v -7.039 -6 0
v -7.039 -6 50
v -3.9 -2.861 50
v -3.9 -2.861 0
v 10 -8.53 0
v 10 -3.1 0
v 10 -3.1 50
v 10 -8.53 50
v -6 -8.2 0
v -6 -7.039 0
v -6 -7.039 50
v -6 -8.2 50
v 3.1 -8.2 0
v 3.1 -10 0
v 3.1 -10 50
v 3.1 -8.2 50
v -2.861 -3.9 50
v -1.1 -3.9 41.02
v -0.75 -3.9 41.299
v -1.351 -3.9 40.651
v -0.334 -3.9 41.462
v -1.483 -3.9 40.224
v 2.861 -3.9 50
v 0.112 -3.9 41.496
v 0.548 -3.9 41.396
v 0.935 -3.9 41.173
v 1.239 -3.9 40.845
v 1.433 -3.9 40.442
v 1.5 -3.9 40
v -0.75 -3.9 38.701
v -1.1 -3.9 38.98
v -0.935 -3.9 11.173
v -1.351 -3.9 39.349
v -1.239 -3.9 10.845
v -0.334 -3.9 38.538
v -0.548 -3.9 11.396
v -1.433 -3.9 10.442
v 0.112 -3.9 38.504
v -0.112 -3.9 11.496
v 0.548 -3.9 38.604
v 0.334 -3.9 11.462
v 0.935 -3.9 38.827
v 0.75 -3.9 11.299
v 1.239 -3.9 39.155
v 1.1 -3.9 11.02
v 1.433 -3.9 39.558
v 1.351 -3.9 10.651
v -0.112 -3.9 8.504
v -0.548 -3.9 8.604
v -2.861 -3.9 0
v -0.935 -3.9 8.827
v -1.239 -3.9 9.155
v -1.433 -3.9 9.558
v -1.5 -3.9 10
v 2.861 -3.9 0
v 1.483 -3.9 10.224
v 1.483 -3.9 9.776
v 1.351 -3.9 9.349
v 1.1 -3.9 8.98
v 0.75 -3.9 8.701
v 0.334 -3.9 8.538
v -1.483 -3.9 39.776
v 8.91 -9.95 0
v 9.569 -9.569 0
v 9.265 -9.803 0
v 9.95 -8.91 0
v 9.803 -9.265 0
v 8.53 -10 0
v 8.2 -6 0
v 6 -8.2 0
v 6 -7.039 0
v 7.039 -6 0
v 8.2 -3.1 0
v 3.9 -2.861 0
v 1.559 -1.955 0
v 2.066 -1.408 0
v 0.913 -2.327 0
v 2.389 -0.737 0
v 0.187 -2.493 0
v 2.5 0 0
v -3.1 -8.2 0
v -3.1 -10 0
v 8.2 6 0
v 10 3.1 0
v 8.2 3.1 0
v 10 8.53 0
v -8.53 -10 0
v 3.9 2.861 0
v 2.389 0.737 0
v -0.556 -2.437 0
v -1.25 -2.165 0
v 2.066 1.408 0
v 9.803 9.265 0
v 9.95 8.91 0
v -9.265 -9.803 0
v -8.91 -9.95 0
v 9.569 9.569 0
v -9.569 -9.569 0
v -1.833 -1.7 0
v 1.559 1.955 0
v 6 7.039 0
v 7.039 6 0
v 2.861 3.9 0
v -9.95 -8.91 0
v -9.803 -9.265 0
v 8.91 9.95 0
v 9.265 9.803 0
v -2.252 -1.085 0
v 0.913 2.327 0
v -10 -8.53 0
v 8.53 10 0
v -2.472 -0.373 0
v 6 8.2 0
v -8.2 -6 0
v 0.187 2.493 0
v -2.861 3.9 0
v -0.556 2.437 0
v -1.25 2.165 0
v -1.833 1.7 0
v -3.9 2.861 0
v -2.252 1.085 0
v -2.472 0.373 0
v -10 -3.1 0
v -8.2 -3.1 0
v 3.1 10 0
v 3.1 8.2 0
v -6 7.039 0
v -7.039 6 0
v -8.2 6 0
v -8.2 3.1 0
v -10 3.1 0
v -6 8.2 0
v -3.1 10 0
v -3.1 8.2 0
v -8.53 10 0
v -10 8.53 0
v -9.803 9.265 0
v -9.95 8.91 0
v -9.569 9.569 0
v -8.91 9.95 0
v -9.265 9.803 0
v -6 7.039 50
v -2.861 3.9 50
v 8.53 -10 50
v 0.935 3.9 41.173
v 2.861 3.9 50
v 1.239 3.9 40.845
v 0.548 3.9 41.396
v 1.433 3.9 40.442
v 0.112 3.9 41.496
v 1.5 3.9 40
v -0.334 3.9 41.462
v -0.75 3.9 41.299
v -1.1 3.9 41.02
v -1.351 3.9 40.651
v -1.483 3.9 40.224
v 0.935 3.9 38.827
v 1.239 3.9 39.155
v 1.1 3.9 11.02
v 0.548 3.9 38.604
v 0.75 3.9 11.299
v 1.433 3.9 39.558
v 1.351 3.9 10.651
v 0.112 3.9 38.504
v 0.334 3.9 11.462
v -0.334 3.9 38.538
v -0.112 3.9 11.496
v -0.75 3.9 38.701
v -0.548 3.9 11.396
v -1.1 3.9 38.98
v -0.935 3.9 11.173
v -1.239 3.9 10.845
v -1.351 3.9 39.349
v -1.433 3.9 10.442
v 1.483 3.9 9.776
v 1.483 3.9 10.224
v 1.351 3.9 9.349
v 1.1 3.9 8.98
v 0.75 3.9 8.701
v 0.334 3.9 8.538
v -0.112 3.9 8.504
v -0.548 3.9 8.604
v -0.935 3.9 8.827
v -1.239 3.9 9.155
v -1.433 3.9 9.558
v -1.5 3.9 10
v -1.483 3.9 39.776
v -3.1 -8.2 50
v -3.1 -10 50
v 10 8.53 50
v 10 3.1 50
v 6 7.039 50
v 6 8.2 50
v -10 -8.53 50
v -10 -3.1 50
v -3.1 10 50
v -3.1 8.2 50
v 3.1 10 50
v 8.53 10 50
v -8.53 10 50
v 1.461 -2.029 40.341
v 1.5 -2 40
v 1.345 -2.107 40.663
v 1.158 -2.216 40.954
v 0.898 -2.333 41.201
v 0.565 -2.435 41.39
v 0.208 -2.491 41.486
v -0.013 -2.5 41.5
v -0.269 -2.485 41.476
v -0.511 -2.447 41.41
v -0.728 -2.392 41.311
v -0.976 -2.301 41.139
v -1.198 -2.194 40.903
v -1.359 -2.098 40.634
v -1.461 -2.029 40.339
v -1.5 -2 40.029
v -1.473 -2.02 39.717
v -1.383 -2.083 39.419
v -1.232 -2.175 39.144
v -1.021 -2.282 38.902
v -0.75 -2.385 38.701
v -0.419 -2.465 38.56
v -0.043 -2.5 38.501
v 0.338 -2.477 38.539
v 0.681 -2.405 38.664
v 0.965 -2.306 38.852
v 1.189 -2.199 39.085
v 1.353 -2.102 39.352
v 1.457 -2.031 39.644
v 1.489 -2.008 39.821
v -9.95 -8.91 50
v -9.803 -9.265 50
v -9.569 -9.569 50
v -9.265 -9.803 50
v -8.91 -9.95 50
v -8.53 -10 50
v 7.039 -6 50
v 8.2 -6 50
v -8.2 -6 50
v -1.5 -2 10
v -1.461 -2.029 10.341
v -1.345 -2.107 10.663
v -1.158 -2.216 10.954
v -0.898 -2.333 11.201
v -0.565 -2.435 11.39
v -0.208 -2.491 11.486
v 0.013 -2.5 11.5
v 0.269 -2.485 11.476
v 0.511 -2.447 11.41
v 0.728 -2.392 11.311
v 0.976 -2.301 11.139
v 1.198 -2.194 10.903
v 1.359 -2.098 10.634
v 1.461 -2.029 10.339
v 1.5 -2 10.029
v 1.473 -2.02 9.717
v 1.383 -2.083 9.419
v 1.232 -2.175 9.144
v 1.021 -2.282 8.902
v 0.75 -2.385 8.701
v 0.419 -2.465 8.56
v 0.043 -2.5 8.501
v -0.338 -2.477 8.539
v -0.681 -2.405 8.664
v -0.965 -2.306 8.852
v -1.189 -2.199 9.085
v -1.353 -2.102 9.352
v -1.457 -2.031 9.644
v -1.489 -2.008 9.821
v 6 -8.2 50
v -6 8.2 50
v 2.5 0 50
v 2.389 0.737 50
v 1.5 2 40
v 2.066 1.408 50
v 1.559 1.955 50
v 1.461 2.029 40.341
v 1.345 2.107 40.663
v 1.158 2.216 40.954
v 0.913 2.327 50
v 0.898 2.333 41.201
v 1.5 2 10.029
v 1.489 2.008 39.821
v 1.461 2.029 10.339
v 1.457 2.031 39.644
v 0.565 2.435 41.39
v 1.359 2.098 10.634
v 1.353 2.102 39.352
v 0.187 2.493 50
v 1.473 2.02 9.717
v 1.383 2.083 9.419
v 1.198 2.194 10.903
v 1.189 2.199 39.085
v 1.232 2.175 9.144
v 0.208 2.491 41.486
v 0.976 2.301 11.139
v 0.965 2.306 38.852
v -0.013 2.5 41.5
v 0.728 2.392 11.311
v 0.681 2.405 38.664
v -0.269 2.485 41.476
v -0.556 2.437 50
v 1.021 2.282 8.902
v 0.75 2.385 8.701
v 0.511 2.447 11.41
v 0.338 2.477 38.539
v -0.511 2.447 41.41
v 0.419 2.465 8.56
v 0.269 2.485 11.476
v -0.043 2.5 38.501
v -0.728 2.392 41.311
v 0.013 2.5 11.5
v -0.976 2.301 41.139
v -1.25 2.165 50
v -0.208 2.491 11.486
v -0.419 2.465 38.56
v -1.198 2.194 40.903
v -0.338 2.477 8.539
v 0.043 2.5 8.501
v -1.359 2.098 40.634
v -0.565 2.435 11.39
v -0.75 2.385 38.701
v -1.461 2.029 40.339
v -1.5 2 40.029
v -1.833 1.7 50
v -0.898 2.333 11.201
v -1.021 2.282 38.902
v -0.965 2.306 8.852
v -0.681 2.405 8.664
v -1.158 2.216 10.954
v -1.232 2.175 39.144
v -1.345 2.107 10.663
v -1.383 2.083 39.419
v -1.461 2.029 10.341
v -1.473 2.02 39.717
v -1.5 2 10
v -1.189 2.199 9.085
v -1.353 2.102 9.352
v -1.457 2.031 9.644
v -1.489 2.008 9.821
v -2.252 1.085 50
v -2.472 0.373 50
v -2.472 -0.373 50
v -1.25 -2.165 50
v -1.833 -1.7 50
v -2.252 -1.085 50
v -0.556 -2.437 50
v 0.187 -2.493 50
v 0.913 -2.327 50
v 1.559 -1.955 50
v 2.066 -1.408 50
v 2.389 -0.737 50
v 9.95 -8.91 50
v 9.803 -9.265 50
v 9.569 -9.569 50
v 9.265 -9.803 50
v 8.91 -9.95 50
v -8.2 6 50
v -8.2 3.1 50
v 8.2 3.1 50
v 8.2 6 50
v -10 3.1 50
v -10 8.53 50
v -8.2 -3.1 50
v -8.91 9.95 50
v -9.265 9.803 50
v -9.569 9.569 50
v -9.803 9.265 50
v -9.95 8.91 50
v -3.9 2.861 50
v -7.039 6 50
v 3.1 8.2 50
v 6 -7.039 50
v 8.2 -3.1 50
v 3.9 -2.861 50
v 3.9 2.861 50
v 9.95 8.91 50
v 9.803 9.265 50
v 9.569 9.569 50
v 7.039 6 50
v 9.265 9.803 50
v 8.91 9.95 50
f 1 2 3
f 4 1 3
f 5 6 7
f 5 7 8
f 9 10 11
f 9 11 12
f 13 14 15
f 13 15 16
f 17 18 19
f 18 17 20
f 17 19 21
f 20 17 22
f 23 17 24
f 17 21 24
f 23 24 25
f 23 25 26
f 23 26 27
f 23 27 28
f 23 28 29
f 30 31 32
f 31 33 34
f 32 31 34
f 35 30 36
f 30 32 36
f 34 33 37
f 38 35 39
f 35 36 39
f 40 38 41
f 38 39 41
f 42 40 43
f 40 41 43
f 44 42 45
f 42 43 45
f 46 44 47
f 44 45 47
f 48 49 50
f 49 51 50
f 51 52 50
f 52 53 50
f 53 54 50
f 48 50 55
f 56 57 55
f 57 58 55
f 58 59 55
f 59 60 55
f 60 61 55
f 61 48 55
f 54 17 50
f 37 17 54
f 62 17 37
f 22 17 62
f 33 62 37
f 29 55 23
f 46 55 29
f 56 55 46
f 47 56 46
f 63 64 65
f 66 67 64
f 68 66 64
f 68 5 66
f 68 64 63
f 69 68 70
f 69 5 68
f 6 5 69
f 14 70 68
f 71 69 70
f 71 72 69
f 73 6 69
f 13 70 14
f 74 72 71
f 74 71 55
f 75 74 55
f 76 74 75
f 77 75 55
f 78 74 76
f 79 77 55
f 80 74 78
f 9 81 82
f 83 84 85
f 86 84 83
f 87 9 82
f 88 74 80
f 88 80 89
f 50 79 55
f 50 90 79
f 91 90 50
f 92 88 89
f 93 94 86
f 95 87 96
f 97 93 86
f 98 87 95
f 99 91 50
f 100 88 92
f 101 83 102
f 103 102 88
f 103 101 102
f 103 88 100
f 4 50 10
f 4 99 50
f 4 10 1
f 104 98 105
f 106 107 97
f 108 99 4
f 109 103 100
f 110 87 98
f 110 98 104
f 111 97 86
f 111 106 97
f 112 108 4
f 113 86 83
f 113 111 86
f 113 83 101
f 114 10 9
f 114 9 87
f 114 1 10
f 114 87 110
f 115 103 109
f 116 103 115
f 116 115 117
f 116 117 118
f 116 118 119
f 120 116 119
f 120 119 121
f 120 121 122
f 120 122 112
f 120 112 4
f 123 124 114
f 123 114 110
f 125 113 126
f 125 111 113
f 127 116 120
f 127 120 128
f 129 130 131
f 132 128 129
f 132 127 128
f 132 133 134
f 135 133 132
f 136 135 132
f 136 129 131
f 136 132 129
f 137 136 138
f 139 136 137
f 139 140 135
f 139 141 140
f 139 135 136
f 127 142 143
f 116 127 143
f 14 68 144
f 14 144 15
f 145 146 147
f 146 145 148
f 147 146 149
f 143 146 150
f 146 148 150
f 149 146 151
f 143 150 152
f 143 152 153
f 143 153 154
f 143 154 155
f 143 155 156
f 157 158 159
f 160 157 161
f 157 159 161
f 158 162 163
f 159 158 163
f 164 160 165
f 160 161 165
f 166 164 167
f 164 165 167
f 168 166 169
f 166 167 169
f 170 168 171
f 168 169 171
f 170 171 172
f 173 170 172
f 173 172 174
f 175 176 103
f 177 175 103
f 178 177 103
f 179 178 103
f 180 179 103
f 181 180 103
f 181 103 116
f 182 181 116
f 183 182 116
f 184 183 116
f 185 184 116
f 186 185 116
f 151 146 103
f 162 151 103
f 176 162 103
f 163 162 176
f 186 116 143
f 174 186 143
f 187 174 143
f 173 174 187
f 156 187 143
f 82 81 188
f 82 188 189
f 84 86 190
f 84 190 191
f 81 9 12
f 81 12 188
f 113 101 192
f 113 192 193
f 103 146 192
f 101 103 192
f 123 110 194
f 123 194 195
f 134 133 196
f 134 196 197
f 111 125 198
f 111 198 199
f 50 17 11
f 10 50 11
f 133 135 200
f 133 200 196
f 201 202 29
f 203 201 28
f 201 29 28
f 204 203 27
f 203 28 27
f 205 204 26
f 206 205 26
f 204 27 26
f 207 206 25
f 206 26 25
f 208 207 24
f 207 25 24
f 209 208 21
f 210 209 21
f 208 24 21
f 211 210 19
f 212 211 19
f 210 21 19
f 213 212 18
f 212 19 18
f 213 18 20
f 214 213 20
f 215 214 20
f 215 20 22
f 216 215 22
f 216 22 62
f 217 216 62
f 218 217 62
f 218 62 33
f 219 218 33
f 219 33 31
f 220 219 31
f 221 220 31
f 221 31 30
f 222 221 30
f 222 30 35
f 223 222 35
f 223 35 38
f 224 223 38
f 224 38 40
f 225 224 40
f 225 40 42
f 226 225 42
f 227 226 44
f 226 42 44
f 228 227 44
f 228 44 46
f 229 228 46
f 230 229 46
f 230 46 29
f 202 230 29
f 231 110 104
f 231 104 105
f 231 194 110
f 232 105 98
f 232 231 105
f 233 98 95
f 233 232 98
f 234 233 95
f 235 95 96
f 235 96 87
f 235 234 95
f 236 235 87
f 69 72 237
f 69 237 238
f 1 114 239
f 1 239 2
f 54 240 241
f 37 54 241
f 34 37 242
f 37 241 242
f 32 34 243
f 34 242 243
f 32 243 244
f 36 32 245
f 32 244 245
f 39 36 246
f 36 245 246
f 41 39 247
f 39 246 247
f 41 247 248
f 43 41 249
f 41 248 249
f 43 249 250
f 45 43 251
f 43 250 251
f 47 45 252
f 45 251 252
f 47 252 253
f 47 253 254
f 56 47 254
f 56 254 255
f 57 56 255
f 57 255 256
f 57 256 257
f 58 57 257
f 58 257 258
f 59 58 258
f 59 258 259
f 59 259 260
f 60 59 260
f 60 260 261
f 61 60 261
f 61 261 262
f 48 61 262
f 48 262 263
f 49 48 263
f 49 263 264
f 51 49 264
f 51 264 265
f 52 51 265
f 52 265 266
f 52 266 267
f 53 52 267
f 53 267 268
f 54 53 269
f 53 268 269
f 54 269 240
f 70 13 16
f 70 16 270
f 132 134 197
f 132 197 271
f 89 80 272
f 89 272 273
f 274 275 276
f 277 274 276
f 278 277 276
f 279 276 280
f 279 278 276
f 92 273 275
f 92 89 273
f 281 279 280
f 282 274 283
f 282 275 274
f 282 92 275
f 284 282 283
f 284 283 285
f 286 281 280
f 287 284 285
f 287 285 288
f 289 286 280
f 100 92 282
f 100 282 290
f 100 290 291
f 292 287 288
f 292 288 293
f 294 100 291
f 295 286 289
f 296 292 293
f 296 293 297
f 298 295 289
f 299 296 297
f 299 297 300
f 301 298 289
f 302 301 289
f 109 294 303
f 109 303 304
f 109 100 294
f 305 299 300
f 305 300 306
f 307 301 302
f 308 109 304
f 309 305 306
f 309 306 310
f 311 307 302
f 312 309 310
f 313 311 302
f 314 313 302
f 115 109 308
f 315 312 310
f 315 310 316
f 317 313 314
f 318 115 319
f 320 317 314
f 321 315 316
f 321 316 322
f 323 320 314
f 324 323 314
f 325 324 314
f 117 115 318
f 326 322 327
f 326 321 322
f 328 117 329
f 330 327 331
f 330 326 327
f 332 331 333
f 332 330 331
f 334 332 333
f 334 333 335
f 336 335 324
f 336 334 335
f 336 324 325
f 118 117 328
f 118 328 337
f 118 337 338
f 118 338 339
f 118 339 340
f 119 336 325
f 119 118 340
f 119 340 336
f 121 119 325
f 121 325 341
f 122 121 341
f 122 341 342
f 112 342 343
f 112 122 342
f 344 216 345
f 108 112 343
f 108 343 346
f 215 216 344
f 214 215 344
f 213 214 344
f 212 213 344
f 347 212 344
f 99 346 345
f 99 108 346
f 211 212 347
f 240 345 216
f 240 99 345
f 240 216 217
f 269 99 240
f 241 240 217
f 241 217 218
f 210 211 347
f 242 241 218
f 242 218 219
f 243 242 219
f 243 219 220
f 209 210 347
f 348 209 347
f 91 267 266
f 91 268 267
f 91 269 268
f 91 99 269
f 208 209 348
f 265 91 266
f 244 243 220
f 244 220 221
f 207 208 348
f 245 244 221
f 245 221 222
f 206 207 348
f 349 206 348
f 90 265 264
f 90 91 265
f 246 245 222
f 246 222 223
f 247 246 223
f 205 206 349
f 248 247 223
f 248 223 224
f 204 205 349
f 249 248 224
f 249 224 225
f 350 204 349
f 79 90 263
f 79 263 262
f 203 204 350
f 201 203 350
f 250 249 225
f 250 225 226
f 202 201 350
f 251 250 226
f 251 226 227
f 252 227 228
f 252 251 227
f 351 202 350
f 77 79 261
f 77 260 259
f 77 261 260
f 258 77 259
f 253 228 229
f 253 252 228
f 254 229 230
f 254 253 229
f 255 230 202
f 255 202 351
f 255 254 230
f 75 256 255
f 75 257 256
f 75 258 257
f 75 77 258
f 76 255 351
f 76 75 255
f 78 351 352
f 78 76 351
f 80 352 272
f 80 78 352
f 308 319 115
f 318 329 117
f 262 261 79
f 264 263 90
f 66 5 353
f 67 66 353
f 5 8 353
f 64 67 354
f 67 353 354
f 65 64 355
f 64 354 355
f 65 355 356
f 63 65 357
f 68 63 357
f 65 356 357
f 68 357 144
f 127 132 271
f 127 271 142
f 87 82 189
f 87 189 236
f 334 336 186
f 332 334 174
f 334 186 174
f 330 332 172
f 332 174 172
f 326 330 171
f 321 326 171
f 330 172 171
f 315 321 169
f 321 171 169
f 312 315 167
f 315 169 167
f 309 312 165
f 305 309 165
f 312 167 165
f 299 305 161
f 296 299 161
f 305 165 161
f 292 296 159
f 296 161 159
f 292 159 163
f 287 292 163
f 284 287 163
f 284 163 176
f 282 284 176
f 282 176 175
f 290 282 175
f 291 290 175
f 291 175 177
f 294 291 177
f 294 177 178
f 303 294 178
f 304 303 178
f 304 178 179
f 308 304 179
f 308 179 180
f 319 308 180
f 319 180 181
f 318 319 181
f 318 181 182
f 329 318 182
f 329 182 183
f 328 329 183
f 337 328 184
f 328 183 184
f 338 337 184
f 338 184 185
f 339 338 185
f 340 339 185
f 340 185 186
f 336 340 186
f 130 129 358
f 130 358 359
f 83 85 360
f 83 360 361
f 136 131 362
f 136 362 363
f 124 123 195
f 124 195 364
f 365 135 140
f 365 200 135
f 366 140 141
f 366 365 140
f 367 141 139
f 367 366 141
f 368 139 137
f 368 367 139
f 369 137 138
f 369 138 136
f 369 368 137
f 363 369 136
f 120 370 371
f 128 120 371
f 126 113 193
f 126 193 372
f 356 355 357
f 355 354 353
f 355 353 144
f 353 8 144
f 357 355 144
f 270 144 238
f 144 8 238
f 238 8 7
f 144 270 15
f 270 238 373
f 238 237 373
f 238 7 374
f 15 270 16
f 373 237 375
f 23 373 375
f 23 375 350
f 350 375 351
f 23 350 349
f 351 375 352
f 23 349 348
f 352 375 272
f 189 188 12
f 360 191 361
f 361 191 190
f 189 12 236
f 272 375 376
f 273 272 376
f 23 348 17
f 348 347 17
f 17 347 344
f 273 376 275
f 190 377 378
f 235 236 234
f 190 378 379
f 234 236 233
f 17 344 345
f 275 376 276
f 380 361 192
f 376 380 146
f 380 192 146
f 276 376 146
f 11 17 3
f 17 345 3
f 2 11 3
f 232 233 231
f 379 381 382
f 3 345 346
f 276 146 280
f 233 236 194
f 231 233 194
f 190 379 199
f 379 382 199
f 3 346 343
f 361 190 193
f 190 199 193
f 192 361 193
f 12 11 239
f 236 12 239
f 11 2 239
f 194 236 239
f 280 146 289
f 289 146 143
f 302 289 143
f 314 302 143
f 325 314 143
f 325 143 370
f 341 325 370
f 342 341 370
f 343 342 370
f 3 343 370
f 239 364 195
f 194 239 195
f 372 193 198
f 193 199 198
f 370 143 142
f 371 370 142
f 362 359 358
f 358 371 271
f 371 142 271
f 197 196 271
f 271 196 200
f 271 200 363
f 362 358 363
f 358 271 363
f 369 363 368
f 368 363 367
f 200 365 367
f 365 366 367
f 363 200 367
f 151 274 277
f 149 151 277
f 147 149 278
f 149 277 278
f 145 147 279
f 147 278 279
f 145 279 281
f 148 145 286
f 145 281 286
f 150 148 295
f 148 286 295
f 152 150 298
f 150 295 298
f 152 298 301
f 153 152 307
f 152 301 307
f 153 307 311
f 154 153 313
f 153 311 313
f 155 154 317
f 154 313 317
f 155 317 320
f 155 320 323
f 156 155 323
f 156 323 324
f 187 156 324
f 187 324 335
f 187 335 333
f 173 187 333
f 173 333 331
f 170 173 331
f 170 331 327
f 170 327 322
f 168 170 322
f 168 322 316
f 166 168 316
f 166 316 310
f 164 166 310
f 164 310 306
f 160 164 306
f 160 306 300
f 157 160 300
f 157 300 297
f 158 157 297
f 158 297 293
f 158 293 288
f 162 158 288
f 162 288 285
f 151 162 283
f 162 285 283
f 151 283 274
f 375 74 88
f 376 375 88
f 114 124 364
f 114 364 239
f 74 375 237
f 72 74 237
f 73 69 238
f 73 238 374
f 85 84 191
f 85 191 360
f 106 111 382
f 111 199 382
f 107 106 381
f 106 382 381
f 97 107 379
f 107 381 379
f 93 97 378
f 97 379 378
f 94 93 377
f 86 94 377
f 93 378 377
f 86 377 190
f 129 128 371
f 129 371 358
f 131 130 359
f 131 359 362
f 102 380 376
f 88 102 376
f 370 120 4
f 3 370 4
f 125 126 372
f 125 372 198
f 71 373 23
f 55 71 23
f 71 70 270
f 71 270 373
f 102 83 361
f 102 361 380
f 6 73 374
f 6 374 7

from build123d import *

# Parameters (mm, degrees)
SKETCH1_R           = 2.5
BOSS_EXTRUDE1_DEPTH = 50
FILLET1_R           = 1.47
SKETCH2_R           = 1.5
CUT_EXTRUDE1_DEPTH  = 53.850827808
SKETCH3_R           = 1.5
CUT_EXTRUDE2_DEPTH  = 53.850827903


with BuildPart() as part:
    # Sketch1 → Boss-Extrude1 (new body)
    with BuildSketch(Plane.XY):
        Polygon((2.860553032, 3.9), (6, 7.039446968), (6, 8.2), (3.1, 8.2), (3.1, 10), (10, 10), (10, 3.1), (8.2, 3.1), (8.2, 6), (7.039446968, 6), (3.9, 2.860553032), (3.9, 0), (3.9, -2.860553032), (7.039446968, -6), (8.2, -6), (8.2, -3.1), (10, -3.1), (10, -10), (3.1, -10), (3.1, -8.2), (6, -8.2), (6, -7.039446968), (2.860553032, -3.9), (0, -3.9), (-2.860553032, -3.9), (-6, -7.039446968), (-6, -8.2), (-3.1, -8.2), (-3.1, -10), (-10, -10), (-10, -3.1), (-8.2, -3.1), (-8.2, -6), (-7.039446968, -6), (-3.9, -2.860553032), (-3.9, 0), (-3.9, 2.860553032), (-7.039446968, 6), (-8.2, 6), (-8.2, 3.1), (-10, 3.1), (-10, 10), (-3.1, 10), (-3.1, 8.2), (-6, 8.2), (-6, 7.039446968), (-2.860553032, 3.9), (0, 3.9), align=None)
        Circle(SKETCH1_R, mode=Mode.SUBTRACT)
    extrude(amount=BOSS_EXTRUDE1_DEPTH)

    # Fillet1
    fillet1_edges = [part.edges().sort_by_distance(p)[0] for p in [
        (10, -10, 25),
        (-10, -10, 25),
        (-10, 10, 25),
        (10, 10, 25),
    ]]
    fillet(fillet1_edges, radius=FILLET1_R)

    # Sketch2 → Cut-Extrude1 (cut, through all)
    with BuildSketch(Plane.XZ.offset(3.9)):
        with Locations((0, 40)):
            Circle(SKETCH2_R)
    extrude(amount=-CUT_EXTRUDE1_DEPTH, mode=Mode.SUBTRACT)

    # Sketch3 → Cut-Extrude2 (cut, through all)
    with BuildSketch(Plane(origin=(0, 3.9, 0), x_dir=(1, 0, 0), z_dir=(0, 1, 0))):
        with Locations(Location((0, -10, 0), (0, 0, 180))):
            Circle(SKETCH3_R)
    extrude(amount=-CUT_EXTRUDE2_DEPTH, mode=Mode.SUBTRACT)


solid = part.part
